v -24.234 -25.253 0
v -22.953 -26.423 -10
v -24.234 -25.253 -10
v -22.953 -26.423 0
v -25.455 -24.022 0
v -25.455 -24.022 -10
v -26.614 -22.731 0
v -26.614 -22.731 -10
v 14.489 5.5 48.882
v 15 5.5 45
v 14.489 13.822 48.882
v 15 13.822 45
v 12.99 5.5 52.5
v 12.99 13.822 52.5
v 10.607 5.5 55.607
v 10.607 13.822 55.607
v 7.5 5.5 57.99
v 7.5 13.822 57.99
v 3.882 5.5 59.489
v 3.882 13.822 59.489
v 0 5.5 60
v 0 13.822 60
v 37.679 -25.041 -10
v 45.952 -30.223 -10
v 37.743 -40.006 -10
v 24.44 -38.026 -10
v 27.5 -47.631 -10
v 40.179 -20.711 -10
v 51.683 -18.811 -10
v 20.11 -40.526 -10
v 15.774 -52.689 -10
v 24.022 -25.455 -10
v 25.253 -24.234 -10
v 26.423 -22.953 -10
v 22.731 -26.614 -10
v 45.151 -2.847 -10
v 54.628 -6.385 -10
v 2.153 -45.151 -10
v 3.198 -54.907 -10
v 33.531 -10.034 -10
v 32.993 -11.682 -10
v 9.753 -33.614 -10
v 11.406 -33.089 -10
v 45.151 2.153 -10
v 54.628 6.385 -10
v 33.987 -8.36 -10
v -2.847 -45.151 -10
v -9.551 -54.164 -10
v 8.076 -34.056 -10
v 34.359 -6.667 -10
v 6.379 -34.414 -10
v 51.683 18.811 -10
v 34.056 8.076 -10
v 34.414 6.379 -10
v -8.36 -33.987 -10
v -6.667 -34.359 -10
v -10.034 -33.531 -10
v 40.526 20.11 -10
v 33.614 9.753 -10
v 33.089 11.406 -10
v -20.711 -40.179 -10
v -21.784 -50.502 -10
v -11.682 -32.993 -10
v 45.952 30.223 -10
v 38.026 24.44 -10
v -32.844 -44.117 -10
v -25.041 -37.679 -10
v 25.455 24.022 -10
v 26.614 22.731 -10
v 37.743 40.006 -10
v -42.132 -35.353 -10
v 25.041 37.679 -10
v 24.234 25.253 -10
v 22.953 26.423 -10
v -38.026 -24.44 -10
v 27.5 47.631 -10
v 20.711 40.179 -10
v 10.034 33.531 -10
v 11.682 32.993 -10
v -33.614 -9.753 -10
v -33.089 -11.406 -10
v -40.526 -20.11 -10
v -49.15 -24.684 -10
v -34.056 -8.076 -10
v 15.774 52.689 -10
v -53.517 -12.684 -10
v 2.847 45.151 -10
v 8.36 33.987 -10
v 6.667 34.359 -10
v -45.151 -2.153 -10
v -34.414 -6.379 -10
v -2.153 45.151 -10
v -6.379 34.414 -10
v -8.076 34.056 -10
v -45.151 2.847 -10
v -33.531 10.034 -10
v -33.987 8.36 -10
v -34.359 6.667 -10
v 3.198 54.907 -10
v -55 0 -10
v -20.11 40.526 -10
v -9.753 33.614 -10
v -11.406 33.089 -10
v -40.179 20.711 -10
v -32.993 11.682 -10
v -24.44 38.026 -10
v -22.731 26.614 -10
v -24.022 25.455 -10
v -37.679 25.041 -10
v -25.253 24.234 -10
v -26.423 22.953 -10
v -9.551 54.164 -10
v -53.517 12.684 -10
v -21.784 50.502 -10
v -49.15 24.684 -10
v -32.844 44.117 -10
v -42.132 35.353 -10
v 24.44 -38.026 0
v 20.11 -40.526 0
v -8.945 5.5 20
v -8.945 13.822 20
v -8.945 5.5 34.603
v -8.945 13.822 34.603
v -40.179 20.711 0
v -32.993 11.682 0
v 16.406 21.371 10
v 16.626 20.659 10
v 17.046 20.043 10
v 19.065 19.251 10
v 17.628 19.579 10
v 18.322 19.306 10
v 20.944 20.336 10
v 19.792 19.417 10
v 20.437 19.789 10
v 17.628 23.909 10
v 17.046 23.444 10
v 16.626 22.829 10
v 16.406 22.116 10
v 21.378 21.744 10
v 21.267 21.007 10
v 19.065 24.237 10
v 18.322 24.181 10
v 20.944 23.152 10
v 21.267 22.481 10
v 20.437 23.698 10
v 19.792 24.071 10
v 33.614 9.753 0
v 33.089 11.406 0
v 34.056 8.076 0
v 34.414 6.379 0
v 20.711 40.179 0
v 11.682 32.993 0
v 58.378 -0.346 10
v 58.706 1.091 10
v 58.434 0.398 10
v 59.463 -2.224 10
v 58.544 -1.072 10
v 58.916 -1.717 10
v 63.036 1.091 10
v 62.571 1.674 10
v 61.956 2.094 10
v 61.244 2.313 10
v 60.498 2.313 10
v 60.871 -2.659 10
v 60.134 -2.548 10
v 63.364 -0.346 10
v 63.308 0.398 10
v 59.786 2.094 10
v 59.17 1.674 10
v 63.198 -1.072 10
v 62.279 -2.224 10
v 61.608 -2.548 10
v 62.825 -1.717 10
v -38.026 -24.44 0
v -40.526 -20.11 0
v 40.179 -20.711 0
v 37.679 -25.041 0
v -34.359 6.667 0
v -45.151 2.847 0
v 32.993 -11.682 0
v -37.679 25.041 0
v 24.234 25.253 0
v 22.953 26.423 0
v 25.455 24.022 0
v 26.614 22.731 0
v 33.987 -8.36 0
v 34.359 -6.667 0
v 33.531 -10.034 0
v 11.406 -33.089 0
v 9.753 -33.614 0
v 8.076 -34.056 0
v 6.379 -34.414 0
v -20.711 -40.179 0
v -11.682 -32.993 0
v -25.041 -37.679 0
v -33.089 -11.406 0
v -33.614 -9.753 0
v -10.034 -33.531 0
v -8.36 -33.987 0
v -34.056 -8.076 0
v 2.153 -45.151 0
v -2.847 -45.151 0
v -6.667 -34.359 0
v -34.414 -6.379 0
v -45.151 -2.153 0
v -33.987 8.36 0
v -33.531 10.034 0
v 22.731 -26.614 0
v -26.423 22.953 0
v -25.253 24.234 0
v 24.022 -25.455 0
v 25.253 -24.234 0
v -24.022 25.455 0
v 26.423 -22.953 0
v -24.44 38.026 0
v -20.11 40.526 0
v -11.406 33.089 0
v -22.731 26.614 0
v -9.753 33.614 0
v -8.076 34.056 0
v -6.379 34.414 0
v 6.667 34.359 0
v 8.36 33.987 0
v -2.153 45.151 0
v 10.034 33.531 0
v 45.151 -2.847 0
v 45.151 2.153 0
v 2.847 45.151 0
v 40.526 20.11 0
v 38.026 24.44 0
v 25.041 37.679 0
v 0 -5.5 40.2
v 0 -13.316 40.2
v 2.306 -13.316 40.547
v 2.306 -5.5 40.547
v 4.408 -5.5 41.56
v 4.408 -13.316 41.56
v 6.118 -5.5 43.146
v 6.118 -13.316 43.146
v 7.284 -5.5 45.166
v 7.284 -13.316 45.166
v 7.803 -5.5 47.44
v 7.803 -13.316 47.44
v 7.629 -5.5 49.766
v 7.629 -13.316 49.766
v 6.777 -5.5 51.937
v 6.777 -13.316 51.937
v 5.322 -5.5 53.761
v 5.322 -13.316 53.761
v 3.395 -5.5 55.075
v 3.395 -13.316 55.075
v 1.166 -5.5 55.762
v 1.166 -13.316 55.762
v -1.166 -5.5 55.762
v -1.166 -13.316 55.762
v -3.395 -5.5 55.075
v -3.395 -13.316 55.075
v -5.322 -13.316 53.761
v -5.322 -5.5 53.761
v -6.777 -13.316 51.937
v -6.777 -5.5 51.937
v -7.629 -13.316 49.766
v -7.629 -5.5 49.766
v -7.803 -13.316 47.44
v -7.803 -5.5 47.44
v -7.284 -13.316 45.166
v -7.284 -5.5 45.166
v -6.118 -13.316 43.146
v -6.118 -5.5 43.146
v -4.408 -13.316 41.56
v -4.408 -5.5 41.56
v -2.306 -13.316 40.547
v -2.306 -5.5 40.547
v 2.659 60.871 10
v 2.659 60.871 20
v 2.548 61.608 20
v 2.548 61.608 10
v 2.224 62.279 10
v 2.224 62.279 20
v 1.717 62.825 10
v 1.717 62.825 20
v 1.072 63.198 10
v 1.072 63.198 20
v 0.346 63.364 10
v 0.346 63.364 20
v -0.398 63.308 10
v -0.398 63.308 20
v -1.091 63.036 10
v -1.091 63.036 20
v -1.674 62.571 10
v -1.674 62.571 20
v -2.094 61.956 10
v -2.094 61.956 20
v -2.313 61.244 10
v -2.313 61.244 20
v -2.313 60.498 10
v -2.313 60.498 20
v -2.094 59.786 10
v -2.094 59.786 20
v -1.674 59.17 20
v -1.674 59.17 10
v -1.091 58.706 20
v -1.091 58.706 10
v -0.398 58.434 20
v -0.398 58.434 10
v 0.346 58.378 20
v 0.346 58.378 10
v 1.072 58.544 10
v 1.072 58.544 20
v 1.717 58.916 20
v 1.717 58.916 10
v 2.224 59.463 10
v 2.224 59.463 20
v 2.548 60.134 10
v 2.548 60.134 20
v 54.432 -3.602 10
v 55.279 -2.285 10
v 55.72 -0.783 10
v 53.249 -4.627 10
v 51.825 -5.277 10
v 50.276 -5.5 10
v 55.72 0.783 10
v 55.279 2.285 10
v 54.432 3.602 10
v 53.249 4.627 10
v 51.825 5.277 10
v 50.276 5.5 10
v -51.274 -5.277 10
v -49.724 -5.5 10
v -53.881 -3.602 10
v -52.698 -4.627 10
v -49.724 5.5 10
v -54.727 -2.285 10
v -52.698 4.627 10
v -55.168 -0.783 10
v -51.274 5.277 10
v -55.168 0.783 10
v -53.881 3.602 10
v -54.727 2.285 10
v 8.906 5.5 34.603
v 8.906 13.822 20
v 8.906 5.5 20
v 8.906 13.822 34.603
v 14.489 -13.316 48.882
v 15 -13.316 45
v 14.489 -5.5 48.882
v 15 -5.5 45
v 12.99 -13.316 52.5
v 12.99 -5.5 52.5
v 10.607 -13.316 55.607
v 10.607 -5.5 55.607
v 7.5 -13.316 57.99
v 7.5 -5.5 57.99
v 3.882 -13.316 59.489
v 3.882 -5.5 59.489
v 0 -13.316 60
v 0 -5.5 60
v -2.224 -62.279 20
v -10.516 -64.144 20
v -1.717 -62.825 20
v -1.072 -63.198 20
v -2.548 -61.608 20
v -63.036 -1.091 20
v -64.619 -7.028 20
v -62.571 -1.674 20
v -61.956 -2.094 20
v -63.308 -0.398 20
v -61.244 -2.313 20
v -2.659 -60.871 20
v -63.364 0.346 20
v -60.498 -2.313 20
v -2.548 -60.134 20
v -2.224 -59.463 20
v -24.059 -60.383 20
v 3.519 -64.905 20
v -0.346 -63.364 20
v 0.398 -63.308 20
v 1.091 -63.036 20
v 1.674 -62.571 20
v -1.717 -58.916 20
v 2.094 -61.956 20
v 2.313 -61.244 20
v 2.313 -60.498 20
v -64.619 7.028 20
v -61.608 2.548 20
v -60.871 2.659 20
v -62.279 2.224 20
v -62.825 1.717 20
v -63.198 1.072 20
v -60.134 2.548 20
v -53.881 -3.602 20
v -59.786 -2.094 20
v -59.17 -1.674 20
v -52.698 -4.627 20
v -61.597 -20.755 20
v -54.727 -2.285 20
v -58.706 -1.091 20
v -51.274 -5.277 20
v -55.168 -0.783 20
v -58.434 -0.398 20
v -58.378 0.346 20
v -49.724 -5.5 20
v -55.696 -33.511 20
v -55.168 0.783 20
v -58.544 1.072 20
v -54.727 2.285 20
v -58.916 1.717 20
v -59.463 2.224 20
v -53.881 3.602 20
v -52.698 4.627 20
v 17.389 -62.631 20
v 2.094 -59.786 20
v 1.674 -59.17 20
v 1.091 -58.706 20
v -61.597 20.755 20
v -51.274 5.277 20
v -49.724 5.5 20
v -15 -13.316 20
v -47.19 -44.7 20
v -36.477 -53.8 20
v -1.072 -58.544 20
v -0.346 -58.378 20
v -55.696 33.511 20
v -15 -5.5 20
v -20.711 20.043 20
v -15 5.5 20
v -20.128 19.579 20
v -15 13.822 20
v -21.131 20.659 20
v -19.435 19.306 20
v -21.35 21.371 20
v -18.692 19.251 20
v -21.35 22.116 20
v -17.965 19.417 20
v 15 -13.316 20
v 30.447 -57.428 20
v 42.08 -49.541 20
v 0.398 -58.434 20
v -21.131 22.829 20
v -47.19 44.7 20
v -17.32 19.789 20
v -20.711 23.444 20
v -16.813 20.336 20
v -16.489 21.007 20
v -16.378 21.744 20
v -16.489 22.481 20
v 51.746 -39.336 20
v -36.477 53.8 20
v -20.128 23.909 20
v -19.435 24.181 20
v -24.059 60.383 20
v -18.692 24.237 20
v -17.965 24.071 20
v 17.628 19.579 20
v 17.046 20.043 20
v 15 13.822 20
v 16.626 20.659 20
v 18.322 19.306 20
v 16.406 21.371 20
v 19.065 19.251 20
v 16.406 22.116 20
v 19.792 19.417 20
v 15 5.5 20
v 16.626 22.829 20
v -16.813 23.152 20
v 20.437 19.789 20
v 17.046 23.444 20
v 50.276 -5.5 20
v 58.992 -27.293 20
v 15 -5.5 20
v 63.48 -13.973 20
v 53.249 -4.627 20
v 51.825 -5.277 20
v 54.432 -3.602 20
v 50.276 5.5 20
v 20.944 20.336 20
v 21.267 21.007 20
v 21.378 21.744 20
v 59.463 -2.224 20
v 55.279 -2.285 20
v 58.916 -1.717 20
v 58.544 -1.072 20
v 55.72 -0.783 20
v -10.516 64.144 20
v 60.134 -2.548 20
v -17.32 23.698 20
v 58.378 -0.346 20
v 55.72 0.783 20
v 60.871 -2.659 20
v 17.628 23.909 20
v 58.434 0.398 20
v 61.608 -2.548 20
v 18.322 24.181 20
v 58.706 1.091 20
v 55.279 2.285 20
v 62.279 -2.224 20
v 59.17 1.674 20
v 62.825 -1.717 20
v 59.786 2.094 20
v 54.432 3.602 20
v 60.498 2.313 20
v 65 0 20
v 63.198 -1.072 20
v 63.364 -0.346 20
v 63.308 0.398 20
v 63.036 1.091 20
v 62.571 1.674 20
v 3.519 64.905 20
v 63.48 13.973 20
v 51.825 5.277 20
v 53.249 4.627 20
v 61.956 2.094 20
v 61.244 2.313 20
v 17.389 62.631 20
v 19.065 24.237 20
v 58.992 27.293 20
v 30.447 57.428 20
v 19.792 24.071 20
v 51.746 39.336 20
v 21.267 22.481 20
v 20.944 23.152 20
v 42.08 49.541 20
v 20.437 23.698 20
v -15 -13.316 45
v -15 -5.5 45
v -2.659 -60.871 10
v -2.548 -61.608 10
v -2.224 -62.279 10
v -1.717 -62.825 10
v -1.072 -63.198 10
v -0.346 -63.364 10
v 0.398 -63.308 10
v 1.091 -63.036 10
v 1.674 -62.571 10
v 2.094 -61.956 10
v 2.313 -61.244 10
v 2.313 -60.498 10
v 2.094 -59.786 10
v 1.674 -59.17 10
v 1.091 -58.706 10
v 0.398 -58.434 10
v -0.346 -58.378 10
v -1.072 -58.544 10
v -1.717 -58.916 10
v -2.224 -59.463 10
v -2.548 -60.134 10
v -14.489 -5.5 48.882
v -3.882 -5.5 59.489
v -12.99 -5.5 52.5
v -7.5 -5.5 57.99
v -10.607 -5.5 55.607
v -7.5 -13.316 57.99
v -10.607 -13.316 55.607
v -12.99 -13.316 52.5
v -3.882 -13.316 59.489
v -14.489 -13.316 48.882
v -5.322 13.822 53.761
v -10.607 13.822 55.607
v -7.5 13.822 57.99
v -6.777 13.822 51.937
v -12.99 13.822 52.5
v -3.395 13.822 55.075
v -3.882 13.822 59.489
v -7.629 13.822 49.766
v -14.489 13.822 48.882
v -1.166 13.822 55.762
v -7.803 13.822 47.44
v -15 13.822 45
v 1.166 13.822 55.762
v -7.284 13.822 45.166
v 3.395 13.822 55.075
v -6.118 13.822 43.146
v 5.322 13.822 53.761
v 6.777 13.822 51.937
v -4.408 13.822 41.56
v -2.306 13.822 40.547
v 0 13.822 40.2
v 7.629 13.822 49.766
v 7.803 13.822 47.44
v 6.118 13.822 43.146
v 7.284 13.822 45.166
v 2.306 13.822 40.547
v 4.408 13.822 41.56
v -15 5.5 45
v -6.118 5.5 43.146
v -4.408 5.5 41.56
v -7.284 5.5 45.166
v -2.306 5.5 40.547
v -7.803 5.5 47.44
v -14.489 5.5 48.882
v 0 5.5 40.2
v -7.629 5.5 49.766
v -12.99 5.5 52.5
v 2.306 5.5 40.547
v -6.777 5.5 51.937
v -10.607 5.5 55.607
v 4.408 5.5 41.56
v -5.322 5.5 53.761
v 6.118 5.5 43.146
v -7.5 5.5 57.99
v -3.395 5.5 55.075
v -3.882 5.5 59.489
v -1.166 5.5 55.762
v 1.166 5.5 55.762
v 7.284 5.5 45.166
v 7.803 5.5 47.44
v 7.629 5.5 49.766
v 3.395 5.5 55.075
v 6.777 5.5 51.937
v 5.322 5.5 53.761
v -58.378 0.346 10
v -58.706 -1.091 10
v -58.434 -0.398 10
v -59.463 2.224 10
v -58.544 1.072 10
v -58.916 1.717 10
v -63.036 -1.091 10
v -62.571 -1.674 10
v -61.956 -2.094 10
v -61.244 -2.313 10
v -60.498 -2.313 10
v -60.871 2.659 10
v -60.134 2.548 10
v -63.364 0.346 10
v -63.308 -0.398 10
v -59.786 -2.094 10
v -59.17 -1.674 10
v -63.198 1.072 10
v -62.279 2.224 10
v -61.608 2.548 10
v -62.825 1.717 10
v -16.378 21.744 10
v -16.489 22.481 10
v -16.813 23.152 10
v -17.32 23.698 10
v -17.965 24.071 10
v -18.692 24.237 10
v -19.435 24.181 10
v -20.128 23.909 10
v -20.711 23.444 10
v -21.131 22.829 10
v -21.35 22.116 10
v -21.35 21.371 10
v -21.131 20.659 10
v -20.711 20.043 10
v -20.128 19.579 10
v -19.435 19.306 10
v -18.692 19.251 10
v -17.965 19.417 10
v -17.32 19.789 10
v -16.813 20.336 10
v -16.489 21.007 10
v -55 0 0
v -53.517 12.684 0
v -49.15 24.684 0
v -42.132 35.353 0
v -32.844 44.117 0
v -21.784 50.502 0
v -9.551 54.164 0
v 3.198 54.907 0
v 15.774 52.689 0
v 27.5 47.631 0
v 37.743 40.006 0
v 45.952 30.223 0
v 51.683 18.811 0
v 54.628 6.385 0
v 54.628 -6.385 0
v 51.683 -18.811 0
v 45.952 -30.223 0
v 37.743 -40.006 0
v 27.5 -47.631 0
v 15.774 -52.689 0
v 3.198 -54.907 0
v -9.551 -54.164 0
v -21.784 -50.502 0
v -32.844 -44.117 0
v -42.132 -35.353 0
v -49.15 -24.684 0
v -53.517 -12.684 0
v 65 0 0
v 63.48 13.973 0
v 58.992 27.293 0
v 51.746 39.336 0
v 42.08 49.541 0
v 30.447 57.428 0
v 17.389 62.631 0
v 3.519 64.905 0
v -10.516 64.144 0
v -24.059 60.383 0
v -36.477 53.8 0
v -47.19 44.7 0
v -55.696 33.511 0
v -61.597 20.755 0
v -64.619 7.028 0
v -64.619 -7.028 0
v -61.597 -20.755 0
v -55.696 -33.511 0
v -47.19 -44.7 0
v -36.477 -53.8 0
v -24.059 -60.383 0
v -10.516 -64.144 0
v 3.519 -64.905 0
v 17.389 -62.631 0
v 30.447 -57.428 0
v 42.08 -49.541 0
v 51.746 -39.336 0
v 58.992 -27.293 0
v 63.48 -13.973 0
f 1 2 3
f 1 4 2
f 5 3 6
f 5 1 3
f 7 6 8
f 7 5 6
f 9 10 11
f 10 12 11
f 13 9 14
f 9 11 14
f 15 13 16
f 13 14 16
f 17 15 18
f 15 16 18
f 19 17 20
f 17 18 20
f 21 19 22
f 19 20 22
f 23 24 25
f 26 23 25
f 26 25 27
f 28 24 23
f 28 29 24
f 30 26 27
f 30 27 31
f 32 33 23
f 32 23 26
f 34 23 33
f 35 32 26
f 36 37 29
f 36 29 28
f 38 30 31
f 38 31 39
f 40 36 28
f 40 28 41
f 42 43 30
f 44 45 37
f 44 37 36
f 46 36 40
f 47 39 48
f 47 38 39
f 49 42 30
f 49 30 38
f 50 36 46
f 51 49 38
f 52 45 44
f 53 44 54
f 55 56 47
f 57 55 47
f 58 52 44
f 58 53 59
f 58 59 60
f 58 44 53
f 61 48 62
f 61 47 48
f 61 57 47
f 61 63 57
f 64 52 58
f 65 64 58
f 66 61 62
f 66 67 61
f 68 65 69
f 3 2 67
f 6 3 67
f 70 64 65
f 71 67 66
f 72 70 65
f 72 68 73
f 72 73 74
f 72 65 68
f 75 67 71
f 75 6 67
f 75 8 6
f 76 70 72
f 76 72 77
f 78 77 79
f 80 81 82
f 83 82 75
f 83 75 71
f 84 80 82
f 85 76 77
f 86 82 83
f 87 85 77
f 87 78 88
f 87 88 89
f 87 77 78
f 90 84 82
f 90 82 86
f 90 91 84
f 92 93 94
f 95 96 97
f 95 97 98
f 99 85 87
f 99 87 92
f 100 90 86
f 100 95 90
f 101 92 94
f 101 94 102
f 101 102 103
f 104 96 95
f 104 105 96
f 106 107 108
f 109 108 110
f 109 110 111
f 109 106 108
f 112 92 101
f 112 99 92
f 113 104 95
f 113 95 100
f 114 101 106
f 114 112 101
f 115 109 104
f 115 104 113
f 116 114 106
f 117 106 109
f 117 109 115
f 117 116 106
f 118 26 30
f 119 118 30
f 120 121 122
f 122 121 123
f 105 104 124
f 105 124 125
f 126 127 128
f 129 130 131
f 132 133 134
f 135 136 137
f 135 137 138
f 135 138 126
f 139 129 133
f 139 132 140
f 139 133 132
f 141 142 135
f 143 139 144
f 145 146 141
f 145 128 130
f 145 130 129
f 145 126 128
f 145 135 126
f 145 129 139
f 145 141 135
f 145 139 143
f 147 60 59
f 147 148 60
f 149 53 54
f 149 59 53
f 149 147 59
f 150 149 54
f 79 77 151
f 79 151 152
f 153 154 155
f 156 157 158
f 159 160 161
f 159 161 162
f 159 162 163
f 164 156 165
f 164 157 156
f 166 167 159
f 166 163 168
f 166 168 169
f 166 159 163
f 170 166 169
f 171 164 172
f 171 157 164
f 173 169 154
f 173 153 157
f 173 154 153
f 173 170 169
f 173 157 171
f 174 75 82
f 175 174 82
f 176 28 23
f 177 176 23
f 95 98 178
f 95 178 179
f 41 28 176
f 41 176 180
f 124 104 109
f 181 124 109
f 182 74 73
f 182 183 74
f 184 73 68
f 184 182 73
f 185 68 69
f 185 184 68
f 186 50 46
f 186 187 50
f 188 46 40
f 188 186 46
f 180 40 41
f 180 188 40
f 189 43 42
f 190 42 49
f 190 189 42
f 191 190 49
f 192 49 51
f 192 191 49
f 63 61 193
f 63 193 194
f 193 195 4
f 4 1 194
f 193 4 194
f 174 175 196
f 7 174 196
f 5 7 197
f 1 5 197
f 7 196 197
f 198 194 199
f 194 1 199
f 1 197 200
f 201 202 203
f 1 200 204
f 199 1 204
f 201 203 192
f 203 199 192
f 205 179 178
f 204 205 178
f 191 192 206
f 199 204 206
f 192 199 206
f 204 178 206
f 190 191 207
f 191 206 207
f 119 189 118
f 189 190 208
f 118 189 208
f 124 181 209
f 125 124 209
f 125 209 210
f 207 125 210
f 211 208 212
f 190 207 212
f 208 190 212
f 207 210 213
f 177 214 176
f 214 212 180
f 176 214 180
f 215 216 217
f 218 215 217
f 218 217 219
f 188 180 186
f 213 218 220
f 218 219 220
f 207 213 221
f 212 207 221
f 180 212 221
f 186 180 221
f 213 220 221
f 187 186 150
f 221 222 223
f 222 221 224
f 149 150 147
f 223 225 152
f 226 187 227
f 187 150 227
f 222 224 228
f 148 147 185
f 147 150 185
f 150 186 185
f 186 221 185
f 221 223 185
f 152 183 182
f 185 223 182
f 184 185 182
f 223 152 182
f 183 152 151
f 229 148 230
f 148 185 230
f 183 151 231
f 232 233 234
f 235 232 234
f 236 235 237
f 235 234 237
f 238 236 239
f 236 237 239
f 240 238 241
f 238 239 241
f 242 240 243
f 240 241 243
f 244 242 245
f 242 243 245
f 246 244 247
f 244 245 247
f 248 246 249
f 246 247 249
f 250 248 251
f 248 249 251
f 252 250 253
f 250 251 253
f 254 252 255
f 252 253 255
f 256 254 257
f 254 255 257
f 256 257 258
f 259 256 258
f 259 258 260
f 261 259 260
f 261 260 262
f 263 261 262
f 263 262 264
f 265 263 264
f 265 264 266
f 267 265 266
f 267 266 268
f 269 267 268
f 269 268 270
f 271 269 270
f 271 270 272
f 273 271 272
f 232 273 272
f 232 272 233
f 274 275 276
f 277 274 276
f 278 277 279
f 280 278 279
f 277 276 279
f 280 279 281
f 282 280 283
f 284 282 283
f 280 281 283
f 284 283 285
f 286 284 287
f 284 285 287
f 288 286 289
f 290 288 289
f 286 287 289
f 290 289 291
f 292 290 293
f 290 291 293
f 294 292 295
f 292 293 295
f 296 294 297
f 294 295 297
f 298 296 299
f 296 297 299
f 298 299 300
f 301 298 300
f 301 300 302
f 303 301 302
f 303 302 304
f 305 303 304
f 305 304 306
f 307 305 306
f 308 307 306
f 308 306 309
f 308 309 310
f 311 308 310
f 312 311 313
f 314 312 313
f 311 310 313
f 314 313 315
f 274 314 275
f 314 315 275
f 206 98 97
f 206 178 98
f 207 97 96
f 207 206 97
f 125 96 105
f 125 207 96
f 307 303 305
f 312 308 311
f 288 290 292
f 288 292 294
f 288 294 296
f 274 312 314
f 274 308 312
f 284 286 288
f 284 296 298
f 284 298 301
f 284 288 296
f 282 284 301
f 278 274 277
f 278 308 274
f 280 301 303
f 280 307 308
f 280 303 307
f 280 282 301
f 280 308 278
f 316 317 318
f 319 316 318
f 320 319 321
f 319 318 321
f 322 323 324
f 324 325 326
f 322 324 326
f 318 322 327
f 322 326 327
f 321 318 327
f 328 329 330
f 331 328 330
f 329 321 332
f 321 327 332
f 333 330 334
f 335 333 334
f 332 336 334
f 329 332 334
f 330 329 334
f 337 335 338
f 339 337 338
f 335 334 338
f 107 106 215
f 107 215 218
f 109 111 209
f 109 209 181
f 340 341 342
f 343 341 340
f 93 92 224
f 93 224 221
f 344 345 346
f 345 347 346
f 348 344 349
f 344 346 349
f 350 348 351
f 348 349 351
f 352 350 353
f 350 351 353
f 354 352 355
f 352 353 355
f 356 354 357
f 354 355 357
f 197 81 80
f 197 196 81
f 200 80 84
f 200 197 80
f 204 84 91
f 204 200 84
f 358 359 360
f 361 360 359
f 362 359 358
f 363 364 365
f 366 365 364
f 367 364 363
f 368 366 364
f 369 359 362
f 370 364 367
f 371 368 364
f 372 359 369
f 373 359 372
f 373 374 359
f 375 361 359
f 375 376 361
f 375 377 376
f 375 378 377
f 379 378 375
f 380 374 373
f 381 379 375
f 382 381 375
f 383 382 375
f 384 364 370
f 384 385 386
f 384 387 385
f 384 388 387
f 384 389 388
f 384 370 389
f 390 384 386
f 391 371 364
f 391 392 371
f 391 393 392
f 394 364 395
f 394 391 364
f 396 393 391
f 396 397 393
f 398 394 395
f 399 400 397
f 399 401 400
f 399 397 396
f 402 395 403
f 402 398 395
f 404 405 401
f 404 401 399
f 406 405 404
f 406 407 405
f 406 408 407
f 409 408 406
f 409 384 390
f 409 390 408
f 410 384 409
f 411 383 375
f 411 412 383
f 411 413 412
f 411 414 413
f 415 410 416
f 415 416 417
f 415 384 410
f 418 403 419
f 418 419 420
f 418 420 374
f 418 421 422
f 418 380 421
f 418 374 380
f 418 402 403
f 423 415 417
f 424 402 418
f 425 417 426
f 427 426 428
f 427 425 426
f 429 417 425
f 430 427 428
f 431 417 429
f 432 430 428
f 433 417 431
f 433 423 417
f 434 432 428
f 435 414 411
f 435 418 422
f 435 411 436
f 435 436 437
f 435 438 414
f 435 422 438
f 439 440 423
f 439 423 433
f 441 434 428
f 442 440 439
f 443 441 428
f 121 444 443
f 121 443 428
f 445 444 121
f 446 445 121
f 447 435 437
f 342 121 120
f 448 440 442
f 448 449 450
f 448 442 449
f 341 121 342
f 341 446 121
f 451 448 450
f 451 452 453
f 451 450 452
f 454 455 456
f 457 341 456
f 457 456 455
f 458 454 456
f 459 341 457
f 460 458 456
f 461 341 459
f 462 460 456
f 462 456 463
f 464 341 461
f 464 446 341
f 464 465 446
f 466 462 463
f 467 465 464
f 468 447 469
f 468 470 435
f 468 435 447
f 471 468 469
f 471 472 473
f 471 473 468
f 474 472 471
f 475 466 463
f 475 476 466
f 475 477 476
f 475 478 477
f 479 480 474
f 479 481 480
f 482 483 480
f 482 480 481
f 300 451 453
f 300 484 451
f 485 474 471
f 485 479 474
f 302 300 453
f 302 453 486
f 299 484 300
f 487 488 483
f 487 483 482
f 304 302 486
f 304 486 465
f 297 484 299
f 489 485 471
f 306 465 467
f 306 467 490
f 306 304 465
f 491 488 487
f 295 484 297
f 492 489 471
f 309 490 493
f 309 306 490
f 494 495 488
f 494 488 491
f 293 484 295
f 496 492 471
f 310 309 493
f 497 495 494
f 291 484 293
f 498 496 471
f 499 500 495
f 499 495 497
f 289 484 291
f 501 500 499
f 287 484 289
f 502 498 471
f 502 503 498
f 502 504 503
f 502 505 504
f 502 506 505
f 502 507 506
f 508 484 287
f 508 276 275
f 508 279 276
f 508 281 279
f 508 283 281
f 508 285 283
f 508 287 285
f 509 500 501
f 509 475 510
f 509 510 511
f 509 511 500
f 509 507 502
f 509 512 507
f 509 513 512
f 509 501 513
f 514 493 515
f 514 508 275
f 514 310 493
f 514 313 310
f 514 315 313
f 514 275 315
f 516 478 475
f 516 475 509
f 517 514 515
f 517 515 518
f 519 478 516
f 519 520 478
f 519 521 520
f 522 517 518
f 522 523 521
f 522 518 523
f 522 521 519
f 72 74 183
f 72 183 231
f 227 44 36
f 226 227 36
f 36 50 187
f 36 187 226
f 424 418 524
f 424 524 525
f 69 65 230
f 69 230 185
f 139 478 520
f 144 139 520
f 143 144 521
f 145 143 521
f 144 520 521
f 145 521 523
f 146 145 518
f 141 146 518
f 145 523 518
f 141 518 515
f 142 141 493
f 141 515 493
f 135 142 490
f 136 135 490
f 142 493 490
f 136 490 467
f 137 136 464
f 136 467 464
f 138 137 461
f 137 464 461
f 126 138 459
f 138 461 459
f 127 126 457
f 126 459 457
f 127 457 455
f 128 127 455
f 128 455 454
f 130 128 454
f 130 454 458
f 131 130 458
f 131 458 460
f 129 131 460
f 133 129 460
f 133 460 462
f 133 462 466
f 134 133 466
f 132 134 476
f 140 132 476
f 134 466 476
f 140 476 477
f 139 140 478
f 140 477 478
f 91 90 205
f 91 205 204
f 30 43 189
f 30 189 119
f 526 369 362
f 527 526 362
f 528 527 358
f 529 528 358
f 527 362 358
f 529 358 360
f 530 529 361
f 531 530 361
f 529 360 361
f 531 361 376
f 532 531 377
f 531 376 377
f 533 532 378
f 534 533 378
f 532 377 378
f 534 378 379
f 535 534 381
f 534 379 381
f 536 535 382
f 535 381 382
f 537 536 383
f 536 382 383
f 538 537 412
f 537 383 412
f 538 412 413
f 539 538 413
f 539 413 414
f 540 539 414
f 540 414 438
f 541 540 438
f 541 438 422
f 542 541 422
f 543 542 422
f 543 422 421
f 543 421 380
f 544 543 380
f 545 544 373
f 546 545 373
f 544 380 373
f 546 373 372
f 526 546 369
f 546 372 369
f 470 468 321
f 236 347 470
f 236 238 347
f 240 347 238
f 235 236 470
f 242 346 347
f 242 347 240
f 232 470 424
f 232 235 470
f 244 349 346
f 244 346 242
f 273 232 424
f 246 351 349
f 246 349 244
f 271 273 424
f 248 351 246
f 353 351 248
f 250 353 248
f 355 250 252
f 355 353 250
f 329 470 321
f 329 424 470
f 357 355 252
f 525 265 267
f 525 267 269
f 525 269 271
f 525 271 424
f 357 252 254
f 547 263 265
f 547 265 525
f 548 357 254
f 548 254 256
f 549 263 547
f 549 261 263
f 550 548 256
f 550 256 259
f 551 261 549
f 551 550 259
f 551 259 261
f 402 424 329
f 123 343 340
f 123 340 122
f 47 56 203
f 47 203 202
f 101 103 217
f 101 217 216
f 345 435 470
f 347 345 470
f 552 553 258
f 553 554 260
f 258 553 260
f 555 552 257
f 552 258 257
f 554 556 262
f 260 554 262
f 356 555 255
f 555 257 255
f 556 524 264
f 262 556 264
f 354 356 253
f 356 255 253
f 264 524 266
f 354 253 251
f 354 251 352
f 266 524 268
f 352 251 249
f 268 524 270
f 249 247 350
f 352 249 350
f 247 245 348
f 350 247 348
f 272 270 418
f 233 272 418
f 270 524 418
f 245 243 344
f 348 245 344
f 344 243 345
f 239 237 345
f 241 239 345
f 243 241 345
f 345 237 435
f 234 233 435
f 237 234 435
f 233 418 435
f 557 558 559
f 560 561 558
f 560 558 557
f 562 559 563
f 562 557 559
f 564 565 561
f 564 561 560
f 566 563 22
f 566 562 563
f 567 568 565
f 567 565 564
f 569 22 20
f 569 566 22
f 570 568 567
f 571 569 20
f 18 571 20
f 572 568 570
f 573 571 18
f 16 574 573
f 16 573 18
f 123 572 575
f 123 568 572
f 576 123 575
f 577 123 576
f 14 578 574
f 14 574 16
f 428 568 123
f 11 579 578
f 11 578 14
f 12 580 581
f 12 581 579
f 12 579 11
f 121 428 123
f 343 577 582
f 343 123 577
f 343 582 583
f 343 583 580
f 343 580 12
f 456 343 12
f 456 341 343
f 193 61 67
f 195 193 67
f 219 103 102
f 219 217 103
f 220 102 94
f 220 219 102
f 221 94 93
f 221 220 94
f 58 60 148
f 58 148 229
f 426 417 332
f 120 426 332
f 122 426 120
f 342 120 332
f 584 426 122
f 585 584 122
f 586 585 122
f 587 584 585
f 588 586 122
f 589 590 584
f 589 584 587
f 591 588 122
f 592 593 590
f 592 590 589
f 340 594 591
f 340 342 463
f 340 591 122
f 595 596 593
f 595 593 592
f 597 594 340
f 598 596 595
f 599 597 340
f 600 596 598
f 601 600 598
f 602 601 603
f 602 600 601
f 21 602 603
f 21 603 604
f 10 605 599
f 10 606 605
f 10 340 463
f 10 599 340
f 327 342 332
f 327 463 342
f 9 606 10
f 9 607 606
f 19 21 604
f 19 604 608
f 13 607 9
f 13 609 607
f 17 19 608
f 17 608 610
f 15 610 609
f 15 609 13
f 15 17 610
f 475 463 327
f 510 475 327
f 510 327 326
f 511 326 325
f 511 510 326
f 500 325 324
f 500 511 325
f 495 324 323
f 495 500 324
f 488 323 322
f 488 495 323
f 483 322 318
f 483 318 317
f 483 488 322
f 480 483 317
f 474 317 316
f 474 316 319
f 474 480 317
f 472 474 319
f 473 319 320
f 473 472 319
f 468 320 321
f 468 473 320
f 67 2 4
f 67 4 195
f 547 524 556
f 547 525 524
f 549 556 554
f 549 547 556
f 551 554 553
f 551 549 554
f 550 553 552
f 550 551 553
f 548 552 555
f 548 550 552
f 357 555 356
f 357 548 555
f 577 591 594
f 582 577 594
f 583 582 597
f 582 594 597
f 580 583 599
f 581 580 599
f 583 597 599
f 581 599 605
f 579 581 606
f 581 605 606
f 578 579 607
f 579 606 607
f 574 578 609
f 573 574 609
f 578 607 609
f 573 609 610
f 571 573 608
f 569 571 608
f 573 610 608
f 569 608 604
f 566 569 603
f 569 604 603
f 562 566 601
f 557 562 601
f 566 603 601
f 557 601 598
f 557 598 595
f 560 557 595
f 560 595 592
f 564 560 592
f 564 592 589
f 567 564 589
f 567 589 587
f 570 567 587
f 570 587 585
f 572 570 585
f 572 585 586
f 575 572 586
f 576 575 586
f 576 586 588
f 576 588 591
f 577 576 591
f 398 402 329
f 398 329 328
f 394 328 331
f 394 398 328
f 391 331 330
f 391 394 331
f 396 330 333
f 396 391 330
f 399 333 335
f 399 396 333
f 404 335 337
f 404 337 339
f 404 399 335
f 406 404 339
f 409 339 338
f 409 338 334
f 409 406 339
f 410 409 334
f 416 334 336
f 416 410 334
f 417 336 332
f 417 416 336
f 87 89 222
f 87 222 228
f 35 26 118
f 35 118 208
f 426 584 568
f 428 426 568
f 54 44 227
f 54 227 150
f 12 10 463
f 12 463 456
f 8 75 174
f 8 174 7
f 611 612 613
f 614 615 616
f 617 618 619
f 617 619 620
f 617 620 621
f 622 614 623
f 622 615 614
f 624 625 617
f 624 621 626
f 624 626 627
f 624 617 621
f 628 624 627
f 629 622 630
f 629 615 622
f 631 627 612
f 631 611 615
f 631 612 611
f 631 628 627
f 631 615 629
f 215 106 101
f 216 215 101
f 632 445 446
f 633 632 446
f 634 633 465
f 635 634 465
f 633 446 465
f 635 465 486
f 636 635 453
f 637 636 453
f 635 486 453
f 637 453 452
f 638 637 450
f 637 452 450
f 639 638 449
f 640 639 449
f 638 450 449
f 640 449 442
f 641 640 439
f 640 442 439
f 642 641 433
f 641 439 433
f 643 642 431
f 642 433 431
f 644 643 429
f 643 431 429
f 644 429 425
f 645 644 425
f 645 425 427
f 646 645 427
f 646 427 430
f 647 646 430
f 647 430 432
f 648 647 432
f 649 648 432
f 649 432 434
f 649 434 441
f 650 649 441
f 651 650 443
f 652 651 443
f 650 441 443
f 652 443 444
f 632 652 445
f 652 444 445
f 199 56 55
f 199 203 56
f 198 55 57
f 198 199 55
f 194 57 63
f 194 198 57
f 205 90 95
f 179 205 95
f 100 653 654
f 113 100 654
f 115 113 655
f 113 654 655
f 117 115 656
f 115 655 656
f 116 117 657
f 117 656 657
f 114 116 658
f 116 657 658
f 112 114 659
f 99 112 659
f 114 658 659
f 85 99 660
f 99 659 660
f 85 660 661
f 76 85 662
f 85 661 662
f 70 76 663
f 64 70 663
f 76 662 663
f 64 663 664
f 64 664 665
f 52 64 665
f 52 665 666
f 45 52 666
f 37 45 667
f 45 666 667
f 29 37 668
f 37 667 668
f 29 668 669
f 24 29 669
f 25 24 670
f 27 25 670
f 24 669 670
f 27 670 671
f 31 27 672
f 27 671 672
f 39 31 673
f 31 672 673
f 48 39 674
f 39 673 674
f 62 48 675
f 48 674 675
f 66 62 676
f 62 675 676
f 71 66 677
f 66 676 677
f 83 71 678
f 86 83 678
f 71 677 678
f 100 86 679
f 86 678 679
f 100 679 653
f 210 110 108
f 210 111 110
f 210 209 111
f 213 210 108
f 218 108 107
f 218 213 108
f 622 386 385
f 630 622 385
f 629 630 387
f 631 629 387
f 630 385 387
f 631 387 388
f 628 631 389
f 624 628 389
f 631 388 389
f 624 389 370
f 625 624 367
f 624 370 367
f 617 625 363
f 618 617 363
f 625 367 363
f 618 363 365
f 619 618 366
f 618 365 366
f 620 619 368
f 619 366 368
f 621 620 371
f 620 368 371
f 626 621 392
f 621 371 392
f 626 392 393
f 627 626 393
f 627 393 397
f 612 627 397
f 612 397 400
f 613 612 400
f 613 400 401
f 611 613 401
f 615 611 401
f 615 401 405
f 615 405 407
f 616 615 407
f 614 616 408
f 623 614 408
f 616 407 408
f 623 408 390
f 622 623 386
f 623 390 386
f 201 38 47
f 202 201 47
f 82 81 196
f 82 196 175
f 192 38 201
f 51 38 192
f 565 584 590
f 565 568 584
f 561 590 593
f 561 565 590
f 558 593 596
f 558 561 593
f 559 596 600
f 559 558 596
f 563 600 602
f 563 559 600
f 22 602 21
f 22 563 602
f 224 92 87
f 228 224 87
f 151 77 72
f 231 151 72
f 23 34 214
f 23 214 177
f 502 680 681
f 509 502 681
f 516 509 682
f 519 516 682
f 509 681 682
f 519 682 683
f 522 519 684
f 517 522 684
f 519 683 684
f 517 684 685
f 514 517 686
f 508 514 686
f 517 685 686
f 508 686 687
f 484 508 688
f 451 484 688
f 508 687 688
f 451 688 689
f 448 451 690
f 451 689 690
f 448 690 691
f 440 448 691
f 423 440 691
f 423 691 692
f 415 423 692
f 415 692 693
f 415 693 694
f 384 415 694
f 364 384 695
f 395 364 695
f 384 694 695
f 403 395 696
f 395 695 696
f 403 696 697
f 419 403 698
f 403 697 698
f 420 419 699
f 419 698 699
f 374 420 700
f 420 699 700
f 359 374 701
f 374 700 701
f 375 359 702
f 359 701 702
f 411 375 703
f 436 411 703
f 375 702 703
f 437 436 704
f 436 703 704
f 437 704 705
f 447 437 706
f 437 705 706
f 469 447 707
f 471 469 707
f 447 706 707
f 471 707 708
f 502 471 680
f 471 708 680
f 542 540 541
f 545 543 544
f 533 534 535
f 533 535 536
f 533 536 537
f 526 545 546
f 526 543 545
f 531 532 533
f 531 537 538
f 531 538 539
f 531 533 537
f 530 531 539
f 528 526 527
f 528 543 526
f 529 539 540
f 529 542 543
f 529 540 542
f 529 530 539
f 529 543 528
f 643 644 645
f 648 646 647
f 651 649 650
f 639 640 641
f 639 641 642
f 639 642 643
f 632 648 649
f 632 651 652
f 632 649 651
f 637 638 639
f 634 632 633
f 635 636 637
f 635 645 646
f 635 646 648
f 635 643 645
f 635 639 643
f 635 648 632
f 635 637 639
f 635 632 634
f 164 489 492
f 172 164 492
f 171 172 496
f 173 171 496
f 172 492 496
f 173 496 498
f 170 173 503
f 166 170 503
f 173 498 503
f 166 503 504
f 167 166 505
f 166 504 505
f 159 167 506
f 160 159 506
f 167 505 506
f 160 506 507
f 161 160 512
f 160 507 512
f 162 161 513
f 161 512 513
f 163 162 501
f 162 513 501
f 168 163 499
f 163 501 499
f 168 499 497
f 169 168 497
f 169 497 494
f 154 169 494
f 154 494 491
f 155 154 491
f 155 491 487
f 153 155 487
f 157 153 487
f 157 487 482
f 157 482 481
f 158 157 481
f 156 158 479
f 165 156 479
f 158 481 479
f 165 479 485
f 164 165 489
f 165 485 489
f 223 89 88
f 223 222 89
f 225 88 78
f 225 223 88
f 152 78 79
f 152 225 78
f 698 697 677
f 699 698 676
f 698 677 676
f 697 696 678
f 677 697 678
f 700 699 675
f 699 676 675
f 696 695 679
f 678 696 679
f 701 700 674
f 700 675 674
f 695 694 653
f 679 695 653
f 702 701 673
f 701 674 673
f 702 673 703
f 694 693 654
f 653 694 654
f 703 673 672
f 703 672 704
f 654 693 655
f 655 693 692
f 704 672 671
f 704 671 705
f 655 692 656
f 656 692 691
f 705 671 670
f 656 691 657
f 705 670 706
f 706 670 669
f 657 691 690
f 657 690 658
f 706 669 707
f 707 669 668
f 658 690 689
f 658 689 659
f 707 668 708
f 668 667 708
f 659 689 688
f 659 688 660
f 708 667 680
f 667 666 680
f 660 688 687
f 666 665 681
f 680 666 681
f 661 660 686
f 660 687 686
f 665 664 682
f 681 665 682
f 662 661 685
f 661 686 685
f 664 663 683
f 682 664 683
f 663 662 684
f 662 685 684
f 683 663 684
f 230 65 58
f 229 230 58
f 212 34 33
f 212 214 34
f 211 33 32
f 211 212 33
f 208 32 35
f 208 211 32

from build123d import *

# Parameters (mm, degrees)
SKETCH2_R           = 65
BOSS_EXTRUDE1_DEPTH = 20
SKETCH4_R           = 55
BOSS_EXTRUDE2_DEPTH = 10
SHELL1_T            = -20
CUT_EXTRUDE4_DEPTH  = 10
CIRPATTERN3_COUNT   = 12
CUT_EXTRUDE5_DEPTH  = 10
SKETCH13_R          = 2.5
CUT_EXTRUDE7_DEPTH  = 10
CIRPATTERN4_COUNT   = 4
SKETCH14_W          = 30
SKETCH14_H          = 8.321649063
SKETCH14_H_2        = 7.815978975
BOSS_EXTRUDE3_DEPTH = 40
SKETCH15_R          = 7.825
CUT_EXTRUDE8_DEPTH  = 60
FILLET3_R           = 15
SKETCH16_W          = 17.850622268
SKETCH16_H          = 14.602901006
CUT_EXTRUDE9_DEPTH  = 10
SKETCH19_R          = 2.5
CUT_EXTRUDE10_DEPTH = 10


with BuildPart() as part:
    # Sketch2 → Boss-Extrude1 (new body)
    with BuildSketch(Plane(origin=(0, 0, 0), x_dir=(0, 1, 0), z_dir=(0, 0, 1))):
        with Locations(Location((0, 0, 0), (0, 0, 270))):
            Circle(SKETCH2_R)
    extrude(amount=BOSS_EXTRUDE1_DEPTH)

    # Sketch4 → Boss-Extrude2 (add)
    with BuildSketch(Plane(origin=(0, 0, 0), x_dir=(1, 0, 0), z_dir=(0, 0, -1))):
        with Locations(Location((0, 0, 0), (0, 0, 180))):
            Circle(SKETCH4_R)
    extrude(amount=BOSS_EXTRUDE2_DEPTH)

    # Shell1
    shell1_openings = [part.faces().sort_by_distance(p)[0] for p in [
        (0, 0, -10),
    ]]
    offset(amount=SHELL1_T, openings=shell1_openings, kind=Kind.INTERSECTION)

    # Sketch11 → Cut-Extrude4 (cut)
    with BuildSketch(Plane(origin=(0, 0, -10), x_dir=(1, 0, 0), z_dir=(0, 0, -1))):
        Polygon((-0.14294056, 45.151393391), (2.152952162, 45.151393391), (6.37913534, 34.41375644), (-6.666711392, 34.359204869), (-2.847047838, 45.151393391), align=None)
    cut_extrude4 = extrude(amount=-CUT_EXTRUDE4_DEPTH, mode=Mode.SUBTRACT)

    # CirPattern3: Cut-Extrude4 ×12 about axis
    cirpattern3_axis = Axis((0, 0, 0), (0, 0, 1))
    for i in range(1, CIRPATTERN3_COUNT):
        add(cut_extrude4.rotate(cirpattern3_axis, i * 360 / CIRPATTERN3_COUNT), mode=Mode.SUBTRACT)

    # Sketch12 → Cut-Extrude5 (cut)
    with BuildSketch(Plane.XY.offset(20)):
        with BuildLine():
            Line((-49.724225287, 5.5), (50.275774713, 5.5))
            ThreePointArc((50.275774713, 5.5), (55.775774713, 0), (50.275774713, -5.5))
            Line((50.275774713, -5.5), (-49.724225287, -5.5))
            ThreePointArc((-49.724225287, -5.5), (-55.224225287, 0), (-49.724225287, 5.5))
        make_face()
    extrude(amount=-CUT_EXTRUDE5_DEPTH, mode=Mode.SUBTRACT)

    # Sketch13 → Cut-Extrude7 (cut)
    with BuildSketch(Plane.XY.offset(20)):
        with Locations((0.158711009, 60.870900594)):
            Circle(SKETCH13_R)
    cut_extrude7 = extrude(amount=-CUT_EXTRUDE7_DEPTH, mode=Mode.SUBTRACT)

    # CirPattern4: Cut-Extrude7 ×4 about axis
    cirpattern4_axis = Axis((0, 0, 0), (0, 0, 1))
    for i in range(1, CIRPATTERN4_COUNT):
        add(cut_extrude7.rotate(cirpattern4_axis, i * 360 / CIRPATTERN4_COUNT), mode=Mode.SUBTRACT)

    # Sketch14 → Boss-Extrude3 (add)
    with BuildSketch(Plane.XY.offset(20)):
        with Locations((0, 9.660824532)):
            Rectangle(SKETCH14_W, SKETCH14_H)
        with Locations((0, -9.407989488)):
            Rectangle(SKETCH14_W, SKETCH14_H_2)
    extrude(amount=BOSS_EXTRUDE3_DEPTH)

    # Sketch15 → Cut-Extrude8 (cut)
    with BuildSketch(Plane.XZ.offset(13.315978975)):
        with Locations(Location((0, 48.024835591, 0), (0, 0, 270))):
            Circle(SKETCH15_R)
    extrude(amount=-CUT_EXTRUDE8_DEPTH, mode=Mode.SUBTRACT)

    # Fillet3
    fillet3_edges = [part.edges().sort_by_distance(p)[0] for p in [
        (-15, -9.407989488, 60),
        (-15, 9.660824531, 60),
        (15, 9.660824531, 60),
        (15, -9.407989488, 60),
    ]]
    fillet(fillet3_edges, radius=FILLET3_R - 0.0001)  # a hair under: the kernel refuses the full size

    # Sketch16 → Cut-Extrude9 (cut)
    with BuildSketch(Plane(origin=(0, 13.821649063, 0), x_dir=(-1, 0, 0), z_dir=(0, 1, 0))):
        with Locations((0.019760197, 27.301450503)):
            Rectangle(SKETCH16_W, SKETCH16_H)
    extrude(amount=-CUT_EXTRUDE9_DEPTH, mode=Mode.SUBTRACT)

    # Sketch19 → Cut-Extrude10 (cut)
    with BuildSketch(Plane.XY.offset(20)):
        with Locations((-18.87834994, 21.74381377)):
            Circle(SKETCH19_R)
        with Locations((18.87834994, 21.74381377)):
            Circle(SKETCH19_R)
    extrude(amount=-CUT_EXTRUDE10_DEPTH, mode=Mode.SUBTRACT)


solid = part.part
